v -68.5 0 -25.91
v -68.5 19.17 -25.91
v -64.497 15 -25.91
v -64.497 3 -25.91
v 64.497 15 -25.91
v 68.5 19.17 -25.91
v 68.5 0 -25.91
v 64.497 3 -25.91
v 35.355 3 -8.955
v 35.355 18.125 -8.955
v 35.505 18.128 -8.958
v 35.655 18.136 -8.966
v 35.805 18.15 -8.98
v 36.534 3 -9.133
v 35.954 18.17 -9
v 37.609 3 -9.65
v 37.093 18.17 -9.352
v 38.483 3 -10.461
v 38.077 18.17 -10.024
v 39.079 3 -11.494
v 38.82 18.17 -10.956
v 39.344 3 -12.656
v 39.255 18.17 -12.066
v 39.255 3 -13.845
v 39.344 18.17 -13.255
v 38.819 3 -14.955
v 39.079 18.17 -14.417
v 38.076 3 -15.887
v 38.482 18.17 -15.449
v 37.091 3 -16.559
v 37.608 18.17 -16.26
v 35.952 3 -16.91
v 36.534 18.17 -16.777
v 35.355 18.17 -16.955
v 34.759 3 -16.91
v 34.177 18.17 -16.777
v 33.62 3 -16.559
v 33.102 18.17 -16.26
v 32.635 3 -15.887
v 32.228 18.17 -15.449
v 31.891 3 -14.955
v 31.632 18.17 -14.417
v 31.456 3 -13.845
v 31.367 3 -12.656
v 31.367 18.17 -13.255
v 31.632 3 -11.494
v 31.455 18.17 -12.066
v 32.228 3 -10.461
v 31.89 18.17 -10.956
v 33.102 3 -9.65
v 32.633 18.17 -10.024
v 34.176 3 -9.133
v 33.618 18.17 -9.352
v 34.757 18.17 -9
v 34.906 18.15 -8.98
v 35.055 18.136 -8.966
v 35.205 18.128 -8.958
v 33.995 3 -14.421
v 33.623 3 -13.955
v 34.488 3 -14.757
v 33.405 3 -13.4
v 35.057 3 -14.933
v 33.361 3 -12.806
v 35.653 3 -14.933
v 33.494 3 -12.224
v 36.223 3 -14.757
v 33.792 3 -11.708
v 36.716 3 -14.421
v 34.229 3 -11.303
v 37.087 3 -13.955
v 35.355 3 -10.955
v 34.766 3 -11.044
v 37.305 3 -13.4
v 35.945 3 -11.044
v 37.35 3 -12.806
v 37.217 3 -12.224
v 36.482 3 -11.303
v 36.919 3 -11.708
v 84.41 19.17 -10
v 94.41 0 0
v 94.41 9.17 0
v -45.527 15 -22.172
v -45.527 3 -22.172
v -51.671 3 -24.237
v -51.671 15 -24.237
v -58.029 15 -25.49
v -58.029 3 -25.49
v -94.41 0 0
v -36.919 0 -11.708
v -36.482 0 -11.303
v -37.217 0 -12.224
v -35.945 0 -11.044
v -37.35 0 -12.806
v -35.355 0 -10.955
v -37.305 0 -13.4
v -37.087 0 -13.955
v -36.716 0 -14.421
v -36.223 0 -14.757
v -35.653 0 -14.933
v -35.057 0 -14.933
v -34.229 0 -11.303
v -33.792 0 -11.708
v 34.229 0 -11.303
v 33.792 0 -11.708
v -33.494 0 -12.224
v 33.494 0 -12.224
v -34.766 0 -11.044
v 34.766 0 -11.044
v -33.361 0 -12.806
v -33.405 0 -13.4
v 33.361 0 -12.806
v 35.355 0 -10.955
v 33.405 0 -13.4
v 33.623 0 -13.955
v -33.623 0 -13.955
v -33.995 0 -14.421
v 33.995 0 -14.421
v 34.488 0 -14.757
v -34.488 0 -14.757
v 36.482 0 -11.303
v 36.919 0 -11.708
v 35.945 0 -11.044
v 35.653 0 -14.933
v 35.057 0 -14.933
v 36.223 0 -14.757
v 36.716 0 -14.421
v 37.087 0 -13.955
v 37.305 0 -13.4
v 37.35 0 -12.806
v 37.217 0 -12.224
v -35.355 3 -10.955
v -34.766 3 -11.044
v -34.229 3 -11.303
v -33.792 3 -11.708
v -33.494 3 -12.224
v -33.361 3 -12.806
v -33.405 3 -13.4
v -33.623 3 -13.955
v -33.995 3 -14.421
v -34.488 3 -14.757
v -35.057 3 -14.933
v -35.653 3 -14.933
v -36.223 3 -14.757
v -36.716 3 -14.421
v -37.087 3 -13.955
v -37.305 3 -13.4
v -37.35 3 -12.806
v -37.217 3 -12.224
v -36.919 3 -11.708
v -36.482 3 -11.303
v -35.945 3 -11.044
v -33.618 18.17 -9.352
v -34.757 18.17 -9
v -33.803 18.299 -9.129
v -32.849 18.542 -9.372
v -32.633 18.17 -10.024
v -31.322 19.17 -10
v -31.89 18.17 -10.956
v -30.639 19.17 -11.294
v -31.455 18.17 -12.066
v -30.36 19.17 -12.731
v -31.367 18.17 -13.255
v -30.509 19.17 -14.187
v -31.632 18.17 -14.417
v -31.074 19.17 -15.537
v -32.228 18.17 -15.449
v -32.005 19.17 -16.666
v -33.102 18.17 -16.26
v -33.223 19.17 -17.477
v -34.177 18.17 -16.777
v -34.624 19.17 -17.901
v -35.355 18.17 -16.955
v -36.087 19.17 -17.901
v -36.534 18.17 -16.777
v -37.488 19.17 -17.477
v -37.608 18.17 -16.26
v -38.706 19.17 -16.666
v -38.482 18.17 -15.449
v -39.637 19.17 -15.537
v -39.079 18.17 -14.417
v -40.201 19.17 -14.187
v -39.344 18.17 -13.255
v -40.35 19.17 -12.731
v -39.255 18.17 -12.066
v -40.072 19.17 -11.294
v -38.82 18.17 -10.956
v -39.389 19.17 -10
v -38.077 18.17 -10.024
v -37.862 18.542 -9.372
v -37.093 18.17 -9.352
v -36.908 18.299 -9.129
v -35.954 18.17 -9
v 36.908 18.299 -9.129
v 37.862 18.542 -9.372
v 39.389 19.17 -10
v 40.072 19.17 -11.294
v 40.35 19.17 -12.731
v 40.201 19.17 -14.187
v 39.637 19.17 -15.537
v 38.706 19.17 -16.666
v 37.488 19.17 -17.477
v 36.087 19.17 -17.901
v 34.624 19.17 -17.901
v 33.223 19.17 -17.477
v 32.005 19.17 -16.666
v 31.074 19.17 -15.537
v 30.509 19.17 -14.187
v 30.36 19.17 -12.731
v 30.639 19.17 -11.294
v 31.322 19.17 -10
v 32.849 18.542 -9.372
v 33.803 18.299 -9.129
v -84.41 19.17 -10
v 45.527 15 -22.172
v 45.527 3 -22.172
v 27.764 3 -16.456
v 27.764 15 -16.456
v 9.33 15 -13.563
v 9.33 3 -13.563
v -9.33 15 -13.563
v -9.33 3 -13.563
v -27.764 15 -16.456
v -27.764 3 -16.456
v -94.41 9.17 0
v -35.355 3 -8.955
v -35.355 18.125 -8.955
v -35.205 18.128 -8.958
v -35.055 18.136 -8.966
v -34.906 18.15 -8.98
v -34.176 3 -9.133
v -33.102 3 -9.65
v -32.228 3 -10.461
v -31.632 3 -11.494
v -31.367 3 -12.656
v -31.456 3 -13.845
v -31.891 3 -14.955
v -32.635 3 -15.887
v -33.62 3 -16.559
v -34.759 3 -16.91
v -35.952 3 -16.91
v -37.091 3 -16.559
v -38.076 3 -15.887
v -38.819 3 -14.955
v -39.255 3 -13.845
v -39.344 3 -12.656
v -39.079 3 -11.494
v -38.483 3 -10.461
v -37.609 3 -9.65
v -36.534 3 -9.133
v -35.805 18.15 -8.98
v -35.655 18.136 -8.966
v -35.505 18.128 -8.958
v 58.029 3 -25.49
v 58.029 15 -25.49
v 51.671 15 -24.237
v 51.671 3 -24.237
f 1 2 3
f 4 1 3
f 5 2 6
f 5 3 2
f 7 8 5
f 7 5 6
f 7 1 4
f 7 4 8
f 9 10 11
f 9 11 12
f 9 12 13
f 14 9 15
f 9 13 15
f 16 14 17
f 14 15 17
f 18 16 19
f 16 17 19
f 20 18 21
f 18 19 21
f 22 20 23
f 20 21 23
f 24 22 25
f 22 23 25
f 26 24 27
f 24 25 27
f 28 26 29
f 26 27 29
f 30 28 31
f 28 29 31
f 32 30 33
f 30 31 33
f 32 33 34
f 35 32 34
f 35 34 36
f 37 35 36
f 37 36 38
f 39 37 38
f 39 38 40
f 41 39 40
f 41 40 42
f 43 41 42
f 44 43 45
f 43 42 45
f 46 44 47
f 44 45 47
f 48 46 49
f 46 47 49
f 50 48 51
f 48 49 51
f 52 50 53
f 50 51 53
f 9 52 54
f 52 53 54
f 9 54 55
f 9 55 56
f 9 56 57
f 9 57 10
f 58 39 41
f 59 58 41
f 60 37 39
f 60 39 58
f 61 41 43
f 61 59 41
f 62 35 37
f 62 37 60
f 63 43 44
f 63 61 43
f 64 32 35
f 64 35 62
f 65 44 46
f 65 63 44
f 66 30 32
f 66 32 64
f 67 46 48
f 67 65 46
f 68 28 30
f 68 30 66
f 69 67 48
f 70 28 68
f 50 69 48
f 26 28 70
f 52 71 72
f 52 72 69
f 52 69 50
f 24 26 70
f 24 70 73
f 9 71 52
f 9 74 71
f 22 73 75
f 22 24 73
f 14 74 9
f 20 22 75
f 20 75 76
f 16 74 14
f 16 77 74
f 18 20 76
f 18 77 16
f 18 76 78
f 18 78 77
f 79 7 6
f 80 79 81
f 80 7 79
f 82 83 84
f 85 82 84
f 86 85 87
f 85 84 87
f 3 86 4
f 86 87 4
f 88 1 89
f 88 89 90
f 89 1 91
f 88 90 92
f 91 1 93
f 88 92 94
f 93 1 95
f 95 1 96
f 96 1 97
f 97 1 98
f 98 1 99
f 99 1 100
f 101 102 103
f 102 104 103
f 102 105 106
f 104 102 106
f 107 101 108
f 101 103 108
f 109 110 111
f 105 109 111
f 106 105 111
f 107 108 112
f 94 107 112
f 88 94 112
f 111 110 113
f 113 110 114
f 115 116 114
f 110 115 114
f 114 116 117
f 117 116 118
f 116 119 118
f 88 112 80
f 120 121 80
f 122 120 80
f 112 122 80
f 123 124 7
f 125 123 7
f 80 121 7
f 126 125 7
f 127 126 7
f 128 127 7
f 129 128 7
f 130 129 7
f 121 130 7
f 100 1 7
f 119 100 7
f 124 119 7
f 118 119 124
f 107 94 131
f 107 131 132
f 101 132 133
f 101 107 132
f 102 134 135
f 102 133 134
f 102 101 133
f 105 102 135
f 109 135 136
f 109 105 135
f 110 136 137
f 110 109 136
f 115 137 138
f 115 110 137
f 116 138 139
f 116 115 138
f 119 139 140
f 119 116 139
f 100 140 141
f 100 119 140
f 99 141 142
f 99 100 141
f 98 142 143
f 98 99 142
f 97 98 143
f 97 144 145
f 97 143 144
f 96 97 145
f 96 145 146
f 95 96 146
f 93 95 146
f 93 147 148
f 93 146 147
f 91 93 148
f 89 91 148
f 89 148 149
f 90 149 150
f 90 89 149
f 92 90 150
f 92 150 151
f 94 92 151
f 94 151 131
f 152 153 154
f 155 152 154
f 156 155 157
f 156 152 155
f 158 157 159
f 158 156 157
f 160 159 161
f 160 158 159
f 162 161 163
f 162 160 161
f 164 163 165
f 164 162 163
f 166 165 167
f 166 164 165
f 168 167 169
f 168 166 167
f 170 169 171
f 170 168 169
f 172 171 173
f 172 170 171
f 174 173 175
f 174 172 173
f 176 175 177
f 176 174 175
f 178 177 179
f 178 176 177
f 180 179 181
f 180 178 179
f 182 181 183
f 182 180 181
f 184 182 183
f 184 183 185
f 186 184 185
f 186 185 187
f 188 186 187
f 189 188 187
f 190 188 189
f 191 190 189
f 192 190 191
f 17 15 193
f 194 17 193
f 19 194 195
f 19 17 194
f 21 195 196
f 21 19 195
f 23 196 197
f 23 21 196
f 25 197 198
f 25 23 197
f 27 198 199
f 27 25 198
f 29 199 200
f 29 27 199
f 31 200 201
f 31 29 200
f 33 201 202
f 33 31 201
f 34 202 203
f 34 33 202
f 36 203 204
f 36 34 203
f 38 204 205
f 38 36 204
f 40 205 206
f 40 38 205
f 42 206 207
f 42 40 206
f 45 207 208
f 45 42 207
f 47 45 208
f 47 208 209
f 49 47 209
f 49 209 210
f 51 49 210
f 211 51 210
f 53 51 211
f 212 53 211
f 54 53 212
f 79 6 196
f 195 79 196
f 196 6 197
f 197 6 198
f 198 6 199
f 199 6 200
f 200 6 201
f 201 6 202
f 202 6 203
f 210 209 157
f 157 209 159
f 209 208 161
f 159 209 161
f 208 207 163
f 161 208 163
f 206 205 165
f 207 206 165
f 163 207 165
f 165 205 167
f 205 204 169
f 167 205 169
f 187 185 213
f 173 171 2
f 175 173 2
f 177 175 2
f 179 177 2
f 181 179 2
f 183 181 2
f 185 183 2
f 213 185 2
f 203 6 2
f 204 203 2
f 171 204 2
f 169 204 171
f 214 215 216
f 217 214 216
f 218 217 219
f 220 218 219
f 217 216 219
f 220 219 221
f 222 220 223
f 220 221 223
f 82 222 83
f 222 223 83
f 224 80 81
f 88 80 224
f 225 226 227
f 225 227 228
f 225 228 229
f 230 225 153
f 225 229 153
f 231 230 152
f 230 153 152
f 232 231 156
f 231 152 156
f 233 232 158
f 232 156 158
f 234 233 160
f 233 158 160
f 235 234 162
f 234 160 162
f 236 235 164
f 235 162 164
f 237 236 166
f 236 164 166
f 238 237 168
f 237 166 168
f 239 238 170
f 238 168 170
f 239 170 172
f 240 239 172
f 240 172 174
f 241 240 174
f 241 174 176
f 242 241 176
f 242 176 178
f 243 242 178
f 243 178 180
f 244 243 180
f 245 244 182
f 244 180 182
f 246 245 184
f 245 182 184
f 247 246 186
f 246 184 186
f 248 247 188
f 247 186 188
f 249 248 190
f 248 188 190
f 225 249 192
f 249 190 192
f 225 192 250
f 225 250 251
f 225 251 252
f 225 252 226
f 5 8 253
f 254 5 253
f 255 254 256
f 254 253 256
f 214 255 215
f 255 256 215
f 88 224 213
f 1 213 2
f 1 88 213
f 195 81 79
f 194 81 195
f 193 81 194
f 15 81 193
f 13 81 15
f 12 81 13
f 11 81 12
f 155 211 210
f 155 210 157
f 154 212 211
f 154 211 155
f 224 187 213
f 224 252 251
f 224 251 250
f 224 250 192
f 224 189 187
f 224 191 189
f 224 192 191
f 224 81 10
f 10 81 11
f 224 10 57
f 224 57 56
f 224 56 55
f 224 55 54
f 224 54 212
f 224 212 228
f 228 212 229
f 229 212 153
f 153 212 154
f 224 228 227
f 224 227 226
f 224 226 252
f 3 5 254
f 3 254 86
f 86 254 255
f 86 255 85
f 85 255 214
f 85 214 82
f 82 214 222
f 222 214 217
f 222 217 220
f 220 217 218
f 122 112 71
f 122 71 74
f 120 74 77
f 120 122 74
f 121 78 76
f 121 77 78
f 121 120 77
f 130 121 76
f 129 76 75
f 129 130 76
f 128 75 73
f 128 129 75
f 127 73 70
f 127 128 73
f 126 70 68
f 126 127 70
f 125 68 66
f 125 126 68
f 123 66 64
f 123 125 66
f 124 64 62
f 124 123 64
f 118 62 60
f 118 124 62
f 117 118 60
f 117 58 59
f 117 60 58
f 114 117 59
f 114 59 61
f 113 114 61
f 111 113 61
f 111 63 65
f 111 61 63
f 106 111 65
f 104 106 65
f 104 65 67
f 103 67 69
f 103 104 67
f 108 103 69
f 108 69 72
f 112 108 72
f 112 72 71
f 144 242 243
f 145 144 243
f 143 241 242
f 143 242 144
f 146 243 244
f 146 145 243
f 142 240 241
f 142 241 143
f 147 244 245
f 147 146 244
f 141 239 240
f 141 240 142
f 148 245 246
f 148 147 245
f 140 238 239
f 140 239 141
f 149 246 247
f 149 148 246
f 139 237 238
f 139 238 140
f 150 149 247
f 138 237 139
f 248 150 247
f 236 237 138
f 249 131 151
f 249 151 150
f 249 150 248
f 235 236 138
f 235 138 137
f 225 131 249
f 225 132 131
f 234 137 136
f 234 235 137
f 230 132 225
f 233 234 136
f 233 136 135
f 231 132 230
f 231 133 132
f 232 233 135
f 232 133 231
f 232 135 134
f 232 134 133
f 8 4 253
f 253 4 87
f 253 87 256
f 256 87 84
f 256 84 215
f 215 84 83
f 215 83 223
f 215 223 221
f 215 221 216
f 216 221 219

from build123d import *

# Parameters (mm, degrees)
BOSS_EXTRUDE1_DEPTH     = 3
BOSS_EXTRUDE2_DEPTH     = 12
BOSS_EXTRUDE3_DEPTH     = 4.17
CUT_EXTRUDE1_DEPTH      = 100.227239708
CUT_EXTRUDE1_DEPTH_BACK = 100.227239708
SKETCH3_R               = 2
CHAMFER1_SIZE           = 10
SKETCH8_R               = 4
CUT_EXTRUDE2_DEPTH      = 16.17
CHAMFER2_SIZE           = 1


with BuildPart() as part:
    # Sketch1 → Boss-Extrude1 (new body)
    with BuildSketch(Plane(origin=(0, 0, 0), x_dir=(1, 0, 0), z_dir=(0, 1, 0))):
        Polygon((-94.41, 0), (94.41, 0), (68.5, 25.91), (-68.5, 25.91), align=None)
    extrude(amount=BOSS_EXTRUDE1_DEPTH)

    # Sketch5 → Boss-Extrude2 (add)
    with BuildSketch(Plane(origin=(0, 3, 0), x_dir=(1, 0, 0), z_dir=(0, 1, 0))):
        with BuildLine():
            Line((-64.496944889, 25.91), (-68.5, 25.91))
            Line((-68.5, 25.91), (-94.41, 0))
            Line((-94.41, 0), (94.41, 0))
            Line((94.41, 0), (68.5, 25.91))
            Line((68.5, 25.91), (64.496944889, 25.91))
            ThreePointArc((64.496944889, 25.91), (54.829686624, 24.966540009), (45.527255216, 22.171764706))
            ThreePointArc((45.527255216, 22.171764706), (0, 13.2), (-45.527255216, 22.171764706))
            ThreePointArc((-45.527255216, 22.171764706), (-54.829686624, 24.966540009), (-64.496944889, 25.91))
        make_face()
    extrude(amount=BOSS_EXTRUDE2_DEPTH)

    # Sketch7 → Boss-Extrude3 (add)
    with BuildSketch(Plane(origin=(0, 15, 0), x_dir=(1, 0, 0), z_dir=(0, 1, 0))):
        Polygon((-94.41, 0), (-68.5, 25.91), (68.5, 25.91), (94.41, 0), align=None)
    extrude(amount=BOSS_EXTRUDE3_DEPTH)

    # Sketch3 → Cut-Extrude1 (cut, two sides: drawn at the far end of the back side and taken through both)
    with BuildSketch(Plane(origin=(0, 3, 0), x_dir=(1, 0, 0), z_dir=(0, 1, 0)).offset(-CUT_EXTRUDE1_DEPTH_BACK)):
        with Locations(Location((-35.355339059, 12.955, 0), (0, 0, 270))):
            Circle(SKETCH3_R)
        with Locations(Location((35.355339059, 12.955, 0), (0, 0, 270))):
            Circle(SKETCH3_R)
    extrude(amount=CUT_EXTRUDE1_DEPTH + CUT_EXTRUDE1_DEPTH_BACK, mode=Mode.SUBTRACT)

    # Chamfer1
    chamfer1_edges = [part.edges().sort_by_distance(p)[0] for p in [
        (0, 19.17, 0),
    ]]
    chamfer(chamfer1_edges, length=CHAMFER1_SIZE)

    # Sketch8 → Cut-Extrude2 (cut)
    with BuildSketch(Plane(origin=(0, 19.17, 0), x_dir=(1, 0, 0), z_dir=(0, 1, 0))):
        with Locations(Location((-35.355339059, 12.955, 0), (0, 0, 270))):
            Circle(SKETCH8_R)
        with Locations(Location((35.355339059, 12.955, 0), (0, 0, 270))):
            Circle(SKETCH8_R)
    extrude(amount=-CUT_EXTRUDE2_DEPTH, mode=Mode.SUBTRACT)

    # Chamfer2
    chamfer2_edges = [part.edges().sort_by_distance(p)[0] for p in [
        (-35.355339059, 19.17, -16.955),
        (35.355339059, 19.17, -16.955),
    ]]
    chamfer(chamfer2_edges, length=CHAMFER2_SIZE)


solid = part.part
